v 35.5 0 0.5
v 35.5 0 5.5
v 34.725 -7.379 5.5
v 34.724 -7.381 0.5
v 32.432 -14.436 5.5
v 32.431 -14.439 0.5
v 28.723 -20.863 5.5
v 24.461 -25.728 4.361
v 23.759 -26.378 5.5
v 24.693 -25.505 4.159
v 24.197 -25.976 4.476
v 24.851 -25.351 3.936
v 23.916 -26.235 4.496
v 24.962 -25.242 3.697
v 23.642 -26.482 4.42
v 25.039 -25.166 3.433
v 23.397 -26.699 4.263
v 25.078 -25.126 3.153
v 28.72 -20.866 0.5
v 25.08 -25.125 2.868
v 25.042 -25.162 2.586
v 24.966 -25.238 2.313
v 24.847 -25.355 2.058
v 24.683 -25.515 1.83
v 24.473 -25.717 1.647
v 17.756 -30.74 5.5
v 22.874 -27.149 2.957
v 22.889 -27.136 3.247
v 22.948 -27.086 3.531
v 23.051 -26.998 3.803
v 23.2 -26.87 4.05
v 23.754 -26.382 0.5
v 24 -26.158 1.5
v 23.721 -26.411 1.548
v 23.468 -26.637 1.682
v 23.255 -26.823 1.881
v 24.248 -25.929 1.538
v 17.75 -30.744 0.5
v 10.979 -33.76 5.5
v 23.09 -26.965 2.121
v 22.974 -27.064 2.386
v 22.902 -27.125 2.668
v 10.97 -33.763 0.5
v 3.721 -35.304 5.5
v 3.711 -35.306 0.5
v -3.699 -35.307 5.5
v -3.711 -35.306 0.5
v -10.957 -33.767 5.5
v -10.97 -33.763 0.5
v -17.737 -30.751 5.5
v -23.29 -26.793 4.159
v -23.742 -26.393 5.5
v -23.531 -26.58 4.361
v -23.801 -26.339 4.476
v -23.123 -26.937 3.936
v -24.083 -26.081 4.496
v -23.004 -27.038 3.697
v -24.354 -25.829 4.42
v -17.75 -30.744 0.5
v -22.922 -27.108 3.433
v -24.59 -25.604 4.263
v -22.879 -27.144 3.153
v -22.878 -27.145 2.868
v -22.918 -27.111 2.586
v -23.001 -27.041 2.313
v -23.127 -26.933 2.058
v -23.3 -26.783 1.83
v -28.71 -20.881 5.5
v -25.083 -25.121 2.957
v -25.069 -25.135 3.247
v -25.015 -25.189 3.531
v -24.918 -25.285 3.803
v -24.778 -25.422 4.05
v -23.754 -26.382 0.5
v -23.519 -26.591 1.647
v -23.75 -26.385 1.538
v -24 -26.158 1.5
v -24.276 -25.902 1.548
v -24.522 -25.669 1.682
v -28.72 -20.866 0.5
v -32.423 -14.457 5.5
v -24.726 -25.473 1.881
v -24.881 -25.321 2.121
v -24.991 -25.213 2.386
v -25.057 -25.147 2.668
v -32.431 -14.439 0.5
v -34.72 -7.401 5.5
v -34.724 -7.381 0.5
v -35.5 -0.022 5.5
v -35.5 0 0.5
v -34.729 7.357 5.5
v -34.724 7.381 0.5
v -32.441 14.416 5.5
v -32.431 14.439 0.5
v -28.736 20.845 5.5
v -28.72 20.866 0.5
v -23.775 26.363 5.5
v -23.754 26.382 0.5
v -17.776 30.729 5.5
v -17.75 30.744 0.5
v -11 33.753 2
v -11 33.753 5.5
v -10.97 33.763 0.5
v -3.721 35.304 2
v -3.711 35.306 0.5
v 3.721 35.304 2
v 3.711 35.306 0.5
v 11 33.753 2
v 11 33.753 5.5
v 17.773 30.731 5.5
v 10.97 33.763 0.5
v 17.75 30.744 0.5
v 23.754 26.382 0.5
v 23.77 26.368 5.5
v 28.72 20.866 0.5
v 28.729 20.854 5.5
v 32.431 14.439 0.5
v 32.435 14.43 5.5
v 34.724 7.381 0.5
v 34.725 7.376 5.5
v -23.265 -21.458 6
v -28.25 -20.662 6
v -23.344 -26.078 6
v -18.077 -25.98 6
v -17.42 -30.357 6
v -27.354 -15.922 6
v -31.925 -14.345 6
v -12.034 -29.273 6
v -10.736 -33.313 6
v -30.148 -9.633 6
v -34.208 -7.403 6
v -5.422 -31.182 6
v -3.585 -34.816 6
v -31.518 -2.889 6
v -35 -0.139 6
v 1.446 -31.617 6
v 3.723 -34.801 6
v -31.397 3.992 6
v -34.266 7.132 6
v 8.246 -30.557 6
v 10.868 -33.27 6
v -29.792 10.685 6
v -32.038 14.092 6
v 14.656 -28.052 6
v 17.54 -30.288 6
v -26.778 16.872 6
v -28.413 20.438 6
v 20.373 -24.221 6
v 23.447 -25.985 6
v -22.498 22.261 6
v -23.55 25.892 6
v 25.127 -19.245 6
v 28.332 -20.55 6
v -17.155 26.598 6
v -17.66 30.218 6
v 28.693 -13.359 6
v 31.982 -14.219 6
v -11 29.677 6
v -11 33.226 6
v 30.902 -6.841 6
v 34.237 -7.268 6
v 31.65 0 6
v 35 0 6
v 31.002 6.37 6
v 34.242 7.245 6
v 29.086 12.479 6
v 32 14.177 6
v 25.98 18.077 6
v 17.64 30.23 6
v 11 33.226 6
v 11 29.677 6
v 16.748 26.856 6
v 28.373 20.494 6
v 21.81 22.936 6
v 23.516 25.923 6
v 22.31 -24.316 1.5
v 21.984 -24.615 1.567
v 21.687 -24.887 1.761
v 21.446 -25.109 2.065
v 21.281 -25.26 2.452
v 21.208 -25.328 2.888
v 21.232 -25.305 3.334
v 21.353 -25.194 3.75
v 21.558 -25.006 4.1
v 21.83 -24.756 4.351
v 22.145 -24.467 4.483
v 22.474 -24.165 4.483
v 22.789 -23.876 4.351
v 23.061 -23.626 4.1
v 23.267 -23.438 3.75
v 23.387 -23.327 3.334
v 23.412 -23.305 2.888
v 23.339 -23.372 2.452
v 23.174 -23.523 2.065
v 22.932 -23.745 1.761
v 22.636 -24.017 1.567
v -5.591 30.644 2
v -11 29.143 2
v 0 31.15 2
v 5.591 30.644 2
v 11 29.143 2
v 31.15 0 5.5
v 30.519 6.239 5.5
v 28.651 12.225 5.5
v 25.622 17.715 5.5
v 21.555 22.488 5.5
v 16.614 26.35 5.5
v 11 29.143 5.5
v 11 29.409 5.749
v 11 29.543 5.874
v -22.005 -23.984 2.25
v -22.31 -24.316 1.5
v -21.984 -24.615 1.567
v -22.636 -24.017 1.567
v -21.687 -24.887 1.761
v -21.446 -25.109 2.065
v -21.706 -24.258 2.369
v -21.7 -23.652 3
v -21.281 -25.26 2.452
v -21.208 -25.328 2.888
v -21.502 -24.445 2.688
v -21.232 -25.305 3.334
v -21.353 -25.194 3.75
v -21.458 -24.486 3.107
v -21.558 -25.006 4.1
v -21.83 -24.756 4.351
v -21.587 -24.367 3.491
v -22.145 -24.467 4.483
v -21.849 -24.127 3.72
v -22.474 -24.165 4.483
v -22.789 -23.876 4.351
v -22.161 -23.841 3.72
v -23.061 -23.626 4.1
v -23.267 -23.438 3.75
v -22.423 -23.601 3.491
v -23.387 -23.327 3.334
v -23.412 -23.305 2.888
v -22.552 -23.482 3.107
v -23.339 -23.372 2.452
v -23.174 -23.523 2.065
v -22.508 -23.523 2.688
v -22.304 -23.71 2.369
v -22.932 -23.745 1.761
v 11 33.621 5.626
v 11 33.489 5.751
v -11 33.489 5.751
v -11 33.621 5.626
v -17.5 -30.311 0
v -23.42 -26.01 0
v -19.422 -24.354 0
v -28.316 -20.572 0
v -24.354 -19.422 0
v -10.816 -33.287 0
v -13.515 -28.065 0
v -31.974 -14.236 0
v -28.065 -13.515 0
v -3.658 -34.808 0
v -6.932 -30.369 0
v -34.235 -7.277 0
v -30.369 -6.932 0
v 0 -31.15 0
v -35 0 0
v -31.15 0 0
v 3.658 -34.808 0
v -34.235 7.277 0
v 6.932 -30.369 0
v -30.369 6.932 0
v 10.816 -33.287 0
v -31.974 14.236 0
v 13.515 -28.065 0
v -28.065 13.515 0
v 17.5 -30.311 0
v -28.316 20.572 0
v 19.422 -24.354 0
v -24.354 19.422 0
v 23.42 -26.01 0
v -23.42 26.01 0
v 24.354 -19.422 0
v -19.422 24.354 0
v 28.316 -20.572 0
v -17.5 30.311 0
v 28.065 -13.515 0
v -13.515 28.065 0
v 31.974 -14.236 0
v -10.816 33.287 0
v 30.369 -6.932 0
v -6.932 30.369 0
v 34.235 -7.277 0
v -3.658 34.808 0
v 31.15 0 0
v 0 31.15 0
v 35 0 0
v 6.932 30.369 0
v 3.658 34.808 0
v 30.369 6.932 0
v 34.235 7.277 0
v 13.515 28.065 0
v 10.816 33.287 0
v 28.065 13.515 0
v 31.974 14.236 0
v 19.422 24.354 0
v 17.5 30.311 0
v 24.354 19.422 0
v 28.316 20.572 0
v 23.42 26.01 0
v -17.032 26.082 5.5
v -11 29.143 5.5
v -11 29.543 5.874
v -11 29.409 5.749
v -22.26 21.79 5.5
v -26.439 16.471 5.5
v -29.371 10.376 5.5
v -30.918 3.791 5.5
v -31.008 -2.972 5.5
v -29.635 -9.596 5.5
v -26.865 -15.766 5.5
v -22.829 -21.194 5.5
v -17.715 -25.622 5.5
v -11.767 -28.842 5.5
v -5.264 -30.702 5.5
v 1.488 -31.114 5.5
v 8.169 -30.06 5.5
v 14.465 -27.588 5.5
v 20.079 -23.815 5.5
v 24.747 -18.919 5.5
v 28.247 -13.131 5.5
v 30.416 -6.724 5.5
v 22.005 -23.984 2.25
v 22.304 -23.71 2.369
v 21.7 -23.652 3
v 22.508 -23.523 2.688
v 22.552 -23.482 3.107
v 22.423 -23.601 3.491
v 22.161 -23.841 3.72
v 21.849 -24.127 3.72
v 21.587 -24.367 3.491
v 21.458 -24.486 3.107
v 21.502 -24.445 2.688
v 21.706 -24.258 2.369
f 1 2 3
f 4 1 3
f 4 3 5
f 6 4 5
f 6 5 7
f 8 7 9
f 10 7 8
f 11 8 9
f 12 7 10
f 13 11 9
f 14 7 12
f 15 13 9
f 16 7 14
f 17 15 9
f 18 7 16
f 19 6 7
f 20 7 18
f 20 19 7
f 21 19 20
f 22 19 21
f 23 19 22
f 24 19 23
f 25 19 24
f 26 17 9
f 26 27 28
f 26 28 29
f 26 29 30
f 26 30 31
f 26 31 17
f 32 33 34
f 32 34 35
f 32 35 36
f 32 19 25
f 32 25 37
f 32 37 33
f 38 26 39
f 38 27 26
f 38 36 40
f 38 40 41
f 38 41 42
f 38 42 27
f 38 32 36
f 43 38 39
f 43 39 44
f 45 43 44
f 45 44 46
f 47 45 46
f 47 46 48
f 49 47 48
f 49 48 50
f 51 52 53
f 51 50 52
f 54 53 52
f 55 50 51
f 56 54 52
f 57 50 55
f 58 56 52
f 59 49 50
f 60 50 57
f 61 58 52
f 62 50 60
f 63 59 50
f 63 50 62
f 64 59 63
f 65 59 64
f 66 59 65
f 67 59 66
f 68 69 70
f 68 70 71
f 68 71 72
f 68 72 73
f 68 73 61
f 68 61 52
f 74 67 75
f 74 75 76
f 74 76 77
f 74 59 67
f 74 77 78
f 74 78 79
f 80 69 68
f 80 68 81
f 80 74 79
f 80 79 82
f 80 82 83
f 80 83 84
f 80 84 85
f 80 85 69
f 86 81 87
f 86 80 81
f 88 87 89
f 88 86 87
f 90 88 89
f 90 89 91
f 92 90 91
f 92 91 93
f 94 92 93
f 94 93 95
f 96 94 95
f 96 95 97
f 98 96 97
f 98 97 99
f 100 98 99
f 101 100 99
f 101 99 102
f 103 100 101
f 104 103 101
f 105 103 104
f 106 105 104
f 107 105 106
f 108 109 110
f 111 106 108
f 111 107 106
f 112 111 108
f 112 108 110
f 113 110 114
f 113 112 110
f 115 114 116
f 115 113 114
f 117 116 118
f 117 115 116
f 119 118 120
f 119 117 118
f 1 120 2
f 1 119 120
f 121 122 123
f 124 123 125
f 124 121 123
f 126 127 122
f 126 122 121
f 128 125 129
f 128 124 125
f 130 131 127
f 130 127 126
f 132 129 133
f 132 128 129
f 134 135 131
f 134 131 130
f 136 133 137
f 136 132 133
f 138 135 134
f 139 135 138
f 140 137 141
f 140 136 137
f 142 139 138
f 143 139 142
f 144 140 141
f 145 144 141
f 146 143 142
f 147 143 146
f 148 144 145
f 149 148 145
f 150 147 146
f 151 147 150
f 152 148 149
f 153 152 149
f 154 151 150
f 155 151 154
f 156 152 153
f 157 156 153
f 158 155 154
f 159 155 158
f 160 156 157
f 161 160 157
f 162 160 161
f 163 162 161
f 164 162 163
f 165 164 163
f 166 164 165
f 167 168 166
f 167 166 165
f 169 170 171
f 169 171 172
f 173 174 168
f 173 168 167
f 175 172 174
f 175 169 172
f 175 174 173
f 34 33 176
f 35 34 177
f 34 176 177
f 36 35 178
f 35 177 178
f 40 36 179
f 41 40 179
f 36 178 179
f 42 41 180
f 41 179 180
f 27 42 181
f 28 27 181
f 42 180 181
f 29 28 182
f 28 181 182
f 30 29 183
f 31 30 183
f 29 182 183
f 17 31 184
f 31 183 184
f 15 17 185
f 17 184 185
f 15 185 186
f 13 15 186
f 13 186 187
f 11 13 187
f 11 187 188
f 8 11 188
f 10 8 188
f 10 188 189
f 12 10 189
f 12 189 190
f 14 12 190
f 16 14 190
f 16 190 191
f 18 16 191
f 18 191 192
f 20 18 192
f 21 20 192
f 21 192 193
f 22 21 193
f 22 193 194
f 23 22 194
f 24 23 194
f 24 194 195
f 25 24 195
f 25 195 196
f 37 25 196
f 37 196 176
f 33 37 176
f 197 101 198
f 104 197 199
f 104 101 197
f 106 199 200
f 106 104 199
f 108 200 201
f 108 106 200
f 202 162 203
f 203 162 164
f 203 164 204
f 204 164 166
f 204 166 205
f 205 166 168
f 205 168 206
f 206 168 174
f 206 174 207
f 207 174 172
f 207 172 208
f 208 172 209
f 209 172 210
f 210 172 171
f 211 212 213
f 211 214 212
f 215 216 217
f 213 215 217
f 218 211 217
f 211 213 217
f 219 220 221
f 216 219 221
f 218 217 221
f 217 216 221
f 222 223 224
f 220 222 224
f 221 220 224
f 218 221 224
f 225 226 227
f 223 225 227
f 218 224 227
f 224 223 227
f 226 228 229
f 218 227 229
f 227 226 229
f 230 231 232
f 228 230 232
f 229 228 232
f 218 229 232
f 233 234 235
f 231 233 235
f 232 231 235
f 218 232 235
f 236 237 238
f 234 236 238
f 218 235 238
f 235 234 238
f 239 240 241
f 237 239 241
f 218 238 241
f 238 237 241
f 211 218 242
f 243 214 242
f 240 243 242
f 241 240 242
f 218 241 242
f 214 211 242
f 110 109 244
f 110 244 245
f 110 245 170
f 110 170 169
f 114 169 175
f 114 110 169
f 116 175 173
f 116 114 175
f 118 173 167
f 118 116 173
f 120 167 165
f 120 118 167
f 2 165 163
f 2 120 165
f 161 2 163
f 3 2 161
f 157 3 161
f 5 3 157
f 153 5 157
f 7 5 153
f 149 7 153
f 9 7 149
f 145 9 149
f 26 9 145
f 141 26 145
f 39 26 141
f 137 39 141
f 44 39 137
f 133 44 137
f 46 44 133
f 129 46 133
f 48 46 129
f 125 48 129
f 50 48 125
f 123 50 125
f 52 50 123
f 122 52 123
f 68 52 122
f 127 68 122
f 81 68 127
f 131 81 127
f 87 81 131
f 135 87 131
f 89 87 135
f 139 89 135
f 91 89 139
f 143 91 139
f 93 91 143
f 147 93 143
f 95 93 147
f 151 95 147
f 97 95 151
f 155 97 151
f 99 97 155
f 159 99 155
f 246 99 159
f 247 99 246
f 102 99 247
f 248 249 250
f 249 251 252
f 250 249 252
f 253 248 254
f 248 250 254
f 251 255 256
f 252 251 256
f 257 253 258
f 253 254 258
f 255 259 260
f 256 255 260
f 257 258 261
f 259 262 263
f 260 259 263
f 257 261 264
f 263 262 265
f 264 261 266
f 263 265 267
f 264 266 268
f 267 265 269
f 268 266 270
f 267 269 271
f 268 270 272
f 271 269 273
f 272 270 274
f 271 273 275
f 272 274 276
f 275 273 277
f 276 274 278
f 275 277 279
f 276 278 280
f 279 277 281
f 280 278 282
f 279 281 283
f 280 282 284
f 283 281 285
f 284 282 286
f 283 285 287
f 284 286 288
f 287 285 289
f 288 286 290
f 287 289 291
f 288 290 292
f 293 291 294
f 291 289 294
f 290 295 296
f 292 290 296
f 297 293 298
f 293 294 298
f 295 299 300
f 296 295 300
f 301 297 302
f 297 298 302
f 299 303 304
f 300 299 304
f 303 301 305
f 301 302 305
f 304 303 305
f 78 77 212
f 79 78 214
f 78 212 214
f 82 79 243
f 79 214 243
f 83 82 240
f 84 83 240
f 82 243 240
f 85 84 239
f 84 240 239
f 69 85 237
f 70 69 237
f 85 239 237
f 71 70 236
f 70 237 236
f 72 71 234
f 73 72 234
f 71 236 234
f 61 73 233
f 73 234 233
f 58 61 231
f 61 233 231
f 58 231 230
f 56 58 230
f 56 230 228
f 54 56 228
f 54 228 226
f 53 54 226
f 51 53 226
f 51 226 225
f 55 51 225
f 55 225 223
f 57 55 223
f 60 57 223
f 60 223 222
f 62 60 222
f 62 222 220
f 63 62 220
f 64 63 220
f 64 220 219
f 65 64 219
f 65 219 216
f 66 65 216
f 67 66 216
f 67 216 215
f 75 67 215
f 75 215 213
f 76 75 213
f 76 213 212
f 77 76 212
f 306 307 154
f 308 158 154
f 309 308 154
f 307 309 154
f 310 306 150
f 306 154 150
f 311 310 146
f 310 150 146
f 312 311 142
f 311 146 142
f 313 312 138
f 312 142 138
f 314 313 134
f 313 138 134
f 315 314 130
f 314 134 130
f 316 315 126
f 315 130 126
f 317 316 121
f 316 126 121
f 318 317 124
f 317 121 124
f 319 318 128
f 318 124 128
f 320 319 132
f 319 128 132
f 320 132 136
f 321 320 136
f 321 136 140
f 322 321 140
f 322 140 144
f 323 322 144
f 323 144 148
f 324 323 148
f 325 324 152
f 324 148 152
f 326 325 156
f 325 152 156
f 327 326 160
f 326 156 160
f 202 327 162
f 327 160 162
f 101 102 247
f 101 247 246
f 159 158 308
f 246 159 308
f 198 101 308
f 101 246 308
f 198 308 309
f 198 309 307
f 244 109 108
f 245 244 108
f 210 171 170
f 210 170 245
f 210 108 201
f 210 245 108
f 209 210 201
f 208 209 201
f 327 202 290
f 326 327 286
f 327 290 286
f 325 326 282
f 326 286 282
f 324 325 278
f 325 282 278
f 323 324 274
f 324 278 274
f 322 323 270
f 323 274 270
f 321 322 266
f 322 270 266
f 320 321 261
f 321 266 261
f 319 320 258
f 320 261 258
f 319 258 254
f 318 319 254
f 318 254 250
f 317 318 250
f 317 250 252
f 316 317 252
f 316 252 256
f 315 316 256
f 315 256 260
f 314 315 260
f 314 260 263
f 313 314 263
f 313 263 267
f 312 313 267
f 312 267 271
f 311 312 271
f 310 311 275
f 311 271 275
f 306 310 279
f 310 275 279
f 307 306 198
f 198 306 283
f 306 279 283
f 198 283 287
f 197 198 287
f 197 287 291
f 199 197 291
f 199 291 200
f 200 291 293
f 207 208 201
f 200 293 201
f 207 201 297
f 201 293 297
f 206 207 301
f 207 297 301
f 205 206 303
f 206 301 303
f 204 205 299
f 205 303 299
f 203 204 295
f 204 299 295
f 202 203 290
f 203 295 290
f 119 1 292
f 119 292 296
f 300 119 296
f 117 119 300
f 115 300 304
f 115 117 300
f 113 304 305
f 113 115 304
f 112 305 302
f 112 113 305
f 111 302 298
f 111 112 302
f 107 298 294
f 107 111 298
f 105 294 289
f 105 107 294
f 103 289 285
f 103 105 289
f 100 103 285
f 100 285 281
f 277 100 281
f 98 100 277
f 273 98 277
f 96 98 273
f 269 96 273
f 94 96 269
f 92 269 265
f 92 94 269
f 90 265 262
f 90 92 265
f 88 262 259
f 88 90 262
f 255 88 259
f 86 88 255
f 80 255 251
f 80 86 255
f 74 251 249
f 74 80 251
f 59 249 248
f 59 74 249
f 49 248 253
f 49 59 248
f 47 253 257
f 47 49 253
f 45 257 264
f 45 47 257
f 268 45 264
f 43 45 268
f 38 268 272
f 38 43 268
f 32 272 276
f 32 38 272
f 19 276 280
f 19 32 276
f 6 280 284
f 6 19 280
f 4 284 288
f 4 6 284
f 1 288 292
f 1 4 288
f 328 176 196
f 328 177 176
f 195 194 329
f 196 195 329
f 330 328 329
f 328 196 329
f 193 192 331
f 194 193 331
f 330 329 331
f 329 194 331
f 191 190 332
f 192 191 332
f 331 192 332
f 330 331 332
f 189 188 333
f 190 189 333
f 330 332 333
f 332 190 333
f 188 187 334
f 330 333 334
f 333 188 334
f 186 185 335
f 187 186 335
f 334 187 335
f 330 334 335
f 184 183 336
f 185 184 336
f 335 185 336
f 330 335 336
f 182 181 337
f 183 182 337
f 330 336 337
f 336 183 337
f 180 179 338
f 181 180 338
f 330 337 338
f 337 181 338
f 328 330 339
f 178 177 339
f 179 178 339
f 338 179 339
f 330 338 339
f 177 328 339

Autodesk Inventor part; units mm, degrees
sketch "草圖1" plane through (0, 0, 0) normal (0, 0, 1) x (1, 0, 0)
  circle A0 centre (0, 0) radius 35.5
  circle A1 centre (0, 0) radius 31.15
  dimension "d0" = 71
  dimension "d3" = 62.3
extrude "擠出1" add sketch "草圖1" along normal blind 6
sketch "草圖2" plane through (0, 0, 6) normal (0, 0, 1) x (1, 0, 0)
  circle A0 centre (0, 0) radius 31.15 projected
  circle A1 centre (0, 0) radius 35.5 projected
  line L0 (0, 0) -> (0, 35.5)
  line L1 (11, 33.7528) -> (11, 29.1431)
  line L2 (-11, 33.7528) -> (-11, 29.1431)
  dimension "d6" = 22
extrude "擠出2" cut sketch "草圖2" against normal blind 4 contours A0 L0 A1 L1 | L2 A1 L0 A0
ref_plane "工作平面1" through (0, 0, 3) normal (0, 0, 1) x (1, 0, 0)
sketch "草圖3" plane through (0, 0, 3) normal (0, 0, 1) x (1, 0, 0)
  line L0 (0, 0) -> (0, -42.4806)
  line L1 (0, 0) -> (-24, -26.1582)
  line L2 (0, 0) -> (24, -26.1582)
  arc A0 (-11, 33.7528) -> (11, 33.7528) centre (0, 0) ccw projected
  line L3 (-24, -26.1582) -> (24, -26.1582)
  dimension "d9" = 48
ref_plane "工作平面2" through (24, -26.1582, 3) normal (0.6761, -0.7368, 0) x (0.7368, 0.6761, 0)
ref_plane "工作平面3" through (-24, -26.1582, 3) normal (-0.6761, -0.7368, 0) x (0.7368, -0.6761, 0)
sketch "草圖4" plane through (24, -26.1582, 3) normal (0.6761, -0.7368, 0) x (0.7368, 0.6761, 0)
  point P0 (0, -3)
  point P1 (0, 0)
hole "孔1" at (24, -26.1582, 3) direction (-0.6761, 0.7368, 0) diameter 3 depth 2.5 tip angle 118
sketch "草圖5" plane through (-24, -26.1582, 3) normal (-0.6761, -0.7368, 0) x (0.7368, -0.6761, 0)
  point P0 (0, -3)
  point P1 (0, 0)
hole "孔2" at (-24, -26.1582, 3) direction (0.6761, 0.7368, 0) diameter 3 depth 2.5 tip angle 118
chamfer "倒角1" distance 0.5 angle 45 5 edges at (-17.7154, -25.622, 6) (25.622, 17.7154, 6) (-35.5, 0, 0) (-20.8537, -28.7293, 6) (28.7293, 20.8537, 6)
properties part number "KE-SP-02-P1"
